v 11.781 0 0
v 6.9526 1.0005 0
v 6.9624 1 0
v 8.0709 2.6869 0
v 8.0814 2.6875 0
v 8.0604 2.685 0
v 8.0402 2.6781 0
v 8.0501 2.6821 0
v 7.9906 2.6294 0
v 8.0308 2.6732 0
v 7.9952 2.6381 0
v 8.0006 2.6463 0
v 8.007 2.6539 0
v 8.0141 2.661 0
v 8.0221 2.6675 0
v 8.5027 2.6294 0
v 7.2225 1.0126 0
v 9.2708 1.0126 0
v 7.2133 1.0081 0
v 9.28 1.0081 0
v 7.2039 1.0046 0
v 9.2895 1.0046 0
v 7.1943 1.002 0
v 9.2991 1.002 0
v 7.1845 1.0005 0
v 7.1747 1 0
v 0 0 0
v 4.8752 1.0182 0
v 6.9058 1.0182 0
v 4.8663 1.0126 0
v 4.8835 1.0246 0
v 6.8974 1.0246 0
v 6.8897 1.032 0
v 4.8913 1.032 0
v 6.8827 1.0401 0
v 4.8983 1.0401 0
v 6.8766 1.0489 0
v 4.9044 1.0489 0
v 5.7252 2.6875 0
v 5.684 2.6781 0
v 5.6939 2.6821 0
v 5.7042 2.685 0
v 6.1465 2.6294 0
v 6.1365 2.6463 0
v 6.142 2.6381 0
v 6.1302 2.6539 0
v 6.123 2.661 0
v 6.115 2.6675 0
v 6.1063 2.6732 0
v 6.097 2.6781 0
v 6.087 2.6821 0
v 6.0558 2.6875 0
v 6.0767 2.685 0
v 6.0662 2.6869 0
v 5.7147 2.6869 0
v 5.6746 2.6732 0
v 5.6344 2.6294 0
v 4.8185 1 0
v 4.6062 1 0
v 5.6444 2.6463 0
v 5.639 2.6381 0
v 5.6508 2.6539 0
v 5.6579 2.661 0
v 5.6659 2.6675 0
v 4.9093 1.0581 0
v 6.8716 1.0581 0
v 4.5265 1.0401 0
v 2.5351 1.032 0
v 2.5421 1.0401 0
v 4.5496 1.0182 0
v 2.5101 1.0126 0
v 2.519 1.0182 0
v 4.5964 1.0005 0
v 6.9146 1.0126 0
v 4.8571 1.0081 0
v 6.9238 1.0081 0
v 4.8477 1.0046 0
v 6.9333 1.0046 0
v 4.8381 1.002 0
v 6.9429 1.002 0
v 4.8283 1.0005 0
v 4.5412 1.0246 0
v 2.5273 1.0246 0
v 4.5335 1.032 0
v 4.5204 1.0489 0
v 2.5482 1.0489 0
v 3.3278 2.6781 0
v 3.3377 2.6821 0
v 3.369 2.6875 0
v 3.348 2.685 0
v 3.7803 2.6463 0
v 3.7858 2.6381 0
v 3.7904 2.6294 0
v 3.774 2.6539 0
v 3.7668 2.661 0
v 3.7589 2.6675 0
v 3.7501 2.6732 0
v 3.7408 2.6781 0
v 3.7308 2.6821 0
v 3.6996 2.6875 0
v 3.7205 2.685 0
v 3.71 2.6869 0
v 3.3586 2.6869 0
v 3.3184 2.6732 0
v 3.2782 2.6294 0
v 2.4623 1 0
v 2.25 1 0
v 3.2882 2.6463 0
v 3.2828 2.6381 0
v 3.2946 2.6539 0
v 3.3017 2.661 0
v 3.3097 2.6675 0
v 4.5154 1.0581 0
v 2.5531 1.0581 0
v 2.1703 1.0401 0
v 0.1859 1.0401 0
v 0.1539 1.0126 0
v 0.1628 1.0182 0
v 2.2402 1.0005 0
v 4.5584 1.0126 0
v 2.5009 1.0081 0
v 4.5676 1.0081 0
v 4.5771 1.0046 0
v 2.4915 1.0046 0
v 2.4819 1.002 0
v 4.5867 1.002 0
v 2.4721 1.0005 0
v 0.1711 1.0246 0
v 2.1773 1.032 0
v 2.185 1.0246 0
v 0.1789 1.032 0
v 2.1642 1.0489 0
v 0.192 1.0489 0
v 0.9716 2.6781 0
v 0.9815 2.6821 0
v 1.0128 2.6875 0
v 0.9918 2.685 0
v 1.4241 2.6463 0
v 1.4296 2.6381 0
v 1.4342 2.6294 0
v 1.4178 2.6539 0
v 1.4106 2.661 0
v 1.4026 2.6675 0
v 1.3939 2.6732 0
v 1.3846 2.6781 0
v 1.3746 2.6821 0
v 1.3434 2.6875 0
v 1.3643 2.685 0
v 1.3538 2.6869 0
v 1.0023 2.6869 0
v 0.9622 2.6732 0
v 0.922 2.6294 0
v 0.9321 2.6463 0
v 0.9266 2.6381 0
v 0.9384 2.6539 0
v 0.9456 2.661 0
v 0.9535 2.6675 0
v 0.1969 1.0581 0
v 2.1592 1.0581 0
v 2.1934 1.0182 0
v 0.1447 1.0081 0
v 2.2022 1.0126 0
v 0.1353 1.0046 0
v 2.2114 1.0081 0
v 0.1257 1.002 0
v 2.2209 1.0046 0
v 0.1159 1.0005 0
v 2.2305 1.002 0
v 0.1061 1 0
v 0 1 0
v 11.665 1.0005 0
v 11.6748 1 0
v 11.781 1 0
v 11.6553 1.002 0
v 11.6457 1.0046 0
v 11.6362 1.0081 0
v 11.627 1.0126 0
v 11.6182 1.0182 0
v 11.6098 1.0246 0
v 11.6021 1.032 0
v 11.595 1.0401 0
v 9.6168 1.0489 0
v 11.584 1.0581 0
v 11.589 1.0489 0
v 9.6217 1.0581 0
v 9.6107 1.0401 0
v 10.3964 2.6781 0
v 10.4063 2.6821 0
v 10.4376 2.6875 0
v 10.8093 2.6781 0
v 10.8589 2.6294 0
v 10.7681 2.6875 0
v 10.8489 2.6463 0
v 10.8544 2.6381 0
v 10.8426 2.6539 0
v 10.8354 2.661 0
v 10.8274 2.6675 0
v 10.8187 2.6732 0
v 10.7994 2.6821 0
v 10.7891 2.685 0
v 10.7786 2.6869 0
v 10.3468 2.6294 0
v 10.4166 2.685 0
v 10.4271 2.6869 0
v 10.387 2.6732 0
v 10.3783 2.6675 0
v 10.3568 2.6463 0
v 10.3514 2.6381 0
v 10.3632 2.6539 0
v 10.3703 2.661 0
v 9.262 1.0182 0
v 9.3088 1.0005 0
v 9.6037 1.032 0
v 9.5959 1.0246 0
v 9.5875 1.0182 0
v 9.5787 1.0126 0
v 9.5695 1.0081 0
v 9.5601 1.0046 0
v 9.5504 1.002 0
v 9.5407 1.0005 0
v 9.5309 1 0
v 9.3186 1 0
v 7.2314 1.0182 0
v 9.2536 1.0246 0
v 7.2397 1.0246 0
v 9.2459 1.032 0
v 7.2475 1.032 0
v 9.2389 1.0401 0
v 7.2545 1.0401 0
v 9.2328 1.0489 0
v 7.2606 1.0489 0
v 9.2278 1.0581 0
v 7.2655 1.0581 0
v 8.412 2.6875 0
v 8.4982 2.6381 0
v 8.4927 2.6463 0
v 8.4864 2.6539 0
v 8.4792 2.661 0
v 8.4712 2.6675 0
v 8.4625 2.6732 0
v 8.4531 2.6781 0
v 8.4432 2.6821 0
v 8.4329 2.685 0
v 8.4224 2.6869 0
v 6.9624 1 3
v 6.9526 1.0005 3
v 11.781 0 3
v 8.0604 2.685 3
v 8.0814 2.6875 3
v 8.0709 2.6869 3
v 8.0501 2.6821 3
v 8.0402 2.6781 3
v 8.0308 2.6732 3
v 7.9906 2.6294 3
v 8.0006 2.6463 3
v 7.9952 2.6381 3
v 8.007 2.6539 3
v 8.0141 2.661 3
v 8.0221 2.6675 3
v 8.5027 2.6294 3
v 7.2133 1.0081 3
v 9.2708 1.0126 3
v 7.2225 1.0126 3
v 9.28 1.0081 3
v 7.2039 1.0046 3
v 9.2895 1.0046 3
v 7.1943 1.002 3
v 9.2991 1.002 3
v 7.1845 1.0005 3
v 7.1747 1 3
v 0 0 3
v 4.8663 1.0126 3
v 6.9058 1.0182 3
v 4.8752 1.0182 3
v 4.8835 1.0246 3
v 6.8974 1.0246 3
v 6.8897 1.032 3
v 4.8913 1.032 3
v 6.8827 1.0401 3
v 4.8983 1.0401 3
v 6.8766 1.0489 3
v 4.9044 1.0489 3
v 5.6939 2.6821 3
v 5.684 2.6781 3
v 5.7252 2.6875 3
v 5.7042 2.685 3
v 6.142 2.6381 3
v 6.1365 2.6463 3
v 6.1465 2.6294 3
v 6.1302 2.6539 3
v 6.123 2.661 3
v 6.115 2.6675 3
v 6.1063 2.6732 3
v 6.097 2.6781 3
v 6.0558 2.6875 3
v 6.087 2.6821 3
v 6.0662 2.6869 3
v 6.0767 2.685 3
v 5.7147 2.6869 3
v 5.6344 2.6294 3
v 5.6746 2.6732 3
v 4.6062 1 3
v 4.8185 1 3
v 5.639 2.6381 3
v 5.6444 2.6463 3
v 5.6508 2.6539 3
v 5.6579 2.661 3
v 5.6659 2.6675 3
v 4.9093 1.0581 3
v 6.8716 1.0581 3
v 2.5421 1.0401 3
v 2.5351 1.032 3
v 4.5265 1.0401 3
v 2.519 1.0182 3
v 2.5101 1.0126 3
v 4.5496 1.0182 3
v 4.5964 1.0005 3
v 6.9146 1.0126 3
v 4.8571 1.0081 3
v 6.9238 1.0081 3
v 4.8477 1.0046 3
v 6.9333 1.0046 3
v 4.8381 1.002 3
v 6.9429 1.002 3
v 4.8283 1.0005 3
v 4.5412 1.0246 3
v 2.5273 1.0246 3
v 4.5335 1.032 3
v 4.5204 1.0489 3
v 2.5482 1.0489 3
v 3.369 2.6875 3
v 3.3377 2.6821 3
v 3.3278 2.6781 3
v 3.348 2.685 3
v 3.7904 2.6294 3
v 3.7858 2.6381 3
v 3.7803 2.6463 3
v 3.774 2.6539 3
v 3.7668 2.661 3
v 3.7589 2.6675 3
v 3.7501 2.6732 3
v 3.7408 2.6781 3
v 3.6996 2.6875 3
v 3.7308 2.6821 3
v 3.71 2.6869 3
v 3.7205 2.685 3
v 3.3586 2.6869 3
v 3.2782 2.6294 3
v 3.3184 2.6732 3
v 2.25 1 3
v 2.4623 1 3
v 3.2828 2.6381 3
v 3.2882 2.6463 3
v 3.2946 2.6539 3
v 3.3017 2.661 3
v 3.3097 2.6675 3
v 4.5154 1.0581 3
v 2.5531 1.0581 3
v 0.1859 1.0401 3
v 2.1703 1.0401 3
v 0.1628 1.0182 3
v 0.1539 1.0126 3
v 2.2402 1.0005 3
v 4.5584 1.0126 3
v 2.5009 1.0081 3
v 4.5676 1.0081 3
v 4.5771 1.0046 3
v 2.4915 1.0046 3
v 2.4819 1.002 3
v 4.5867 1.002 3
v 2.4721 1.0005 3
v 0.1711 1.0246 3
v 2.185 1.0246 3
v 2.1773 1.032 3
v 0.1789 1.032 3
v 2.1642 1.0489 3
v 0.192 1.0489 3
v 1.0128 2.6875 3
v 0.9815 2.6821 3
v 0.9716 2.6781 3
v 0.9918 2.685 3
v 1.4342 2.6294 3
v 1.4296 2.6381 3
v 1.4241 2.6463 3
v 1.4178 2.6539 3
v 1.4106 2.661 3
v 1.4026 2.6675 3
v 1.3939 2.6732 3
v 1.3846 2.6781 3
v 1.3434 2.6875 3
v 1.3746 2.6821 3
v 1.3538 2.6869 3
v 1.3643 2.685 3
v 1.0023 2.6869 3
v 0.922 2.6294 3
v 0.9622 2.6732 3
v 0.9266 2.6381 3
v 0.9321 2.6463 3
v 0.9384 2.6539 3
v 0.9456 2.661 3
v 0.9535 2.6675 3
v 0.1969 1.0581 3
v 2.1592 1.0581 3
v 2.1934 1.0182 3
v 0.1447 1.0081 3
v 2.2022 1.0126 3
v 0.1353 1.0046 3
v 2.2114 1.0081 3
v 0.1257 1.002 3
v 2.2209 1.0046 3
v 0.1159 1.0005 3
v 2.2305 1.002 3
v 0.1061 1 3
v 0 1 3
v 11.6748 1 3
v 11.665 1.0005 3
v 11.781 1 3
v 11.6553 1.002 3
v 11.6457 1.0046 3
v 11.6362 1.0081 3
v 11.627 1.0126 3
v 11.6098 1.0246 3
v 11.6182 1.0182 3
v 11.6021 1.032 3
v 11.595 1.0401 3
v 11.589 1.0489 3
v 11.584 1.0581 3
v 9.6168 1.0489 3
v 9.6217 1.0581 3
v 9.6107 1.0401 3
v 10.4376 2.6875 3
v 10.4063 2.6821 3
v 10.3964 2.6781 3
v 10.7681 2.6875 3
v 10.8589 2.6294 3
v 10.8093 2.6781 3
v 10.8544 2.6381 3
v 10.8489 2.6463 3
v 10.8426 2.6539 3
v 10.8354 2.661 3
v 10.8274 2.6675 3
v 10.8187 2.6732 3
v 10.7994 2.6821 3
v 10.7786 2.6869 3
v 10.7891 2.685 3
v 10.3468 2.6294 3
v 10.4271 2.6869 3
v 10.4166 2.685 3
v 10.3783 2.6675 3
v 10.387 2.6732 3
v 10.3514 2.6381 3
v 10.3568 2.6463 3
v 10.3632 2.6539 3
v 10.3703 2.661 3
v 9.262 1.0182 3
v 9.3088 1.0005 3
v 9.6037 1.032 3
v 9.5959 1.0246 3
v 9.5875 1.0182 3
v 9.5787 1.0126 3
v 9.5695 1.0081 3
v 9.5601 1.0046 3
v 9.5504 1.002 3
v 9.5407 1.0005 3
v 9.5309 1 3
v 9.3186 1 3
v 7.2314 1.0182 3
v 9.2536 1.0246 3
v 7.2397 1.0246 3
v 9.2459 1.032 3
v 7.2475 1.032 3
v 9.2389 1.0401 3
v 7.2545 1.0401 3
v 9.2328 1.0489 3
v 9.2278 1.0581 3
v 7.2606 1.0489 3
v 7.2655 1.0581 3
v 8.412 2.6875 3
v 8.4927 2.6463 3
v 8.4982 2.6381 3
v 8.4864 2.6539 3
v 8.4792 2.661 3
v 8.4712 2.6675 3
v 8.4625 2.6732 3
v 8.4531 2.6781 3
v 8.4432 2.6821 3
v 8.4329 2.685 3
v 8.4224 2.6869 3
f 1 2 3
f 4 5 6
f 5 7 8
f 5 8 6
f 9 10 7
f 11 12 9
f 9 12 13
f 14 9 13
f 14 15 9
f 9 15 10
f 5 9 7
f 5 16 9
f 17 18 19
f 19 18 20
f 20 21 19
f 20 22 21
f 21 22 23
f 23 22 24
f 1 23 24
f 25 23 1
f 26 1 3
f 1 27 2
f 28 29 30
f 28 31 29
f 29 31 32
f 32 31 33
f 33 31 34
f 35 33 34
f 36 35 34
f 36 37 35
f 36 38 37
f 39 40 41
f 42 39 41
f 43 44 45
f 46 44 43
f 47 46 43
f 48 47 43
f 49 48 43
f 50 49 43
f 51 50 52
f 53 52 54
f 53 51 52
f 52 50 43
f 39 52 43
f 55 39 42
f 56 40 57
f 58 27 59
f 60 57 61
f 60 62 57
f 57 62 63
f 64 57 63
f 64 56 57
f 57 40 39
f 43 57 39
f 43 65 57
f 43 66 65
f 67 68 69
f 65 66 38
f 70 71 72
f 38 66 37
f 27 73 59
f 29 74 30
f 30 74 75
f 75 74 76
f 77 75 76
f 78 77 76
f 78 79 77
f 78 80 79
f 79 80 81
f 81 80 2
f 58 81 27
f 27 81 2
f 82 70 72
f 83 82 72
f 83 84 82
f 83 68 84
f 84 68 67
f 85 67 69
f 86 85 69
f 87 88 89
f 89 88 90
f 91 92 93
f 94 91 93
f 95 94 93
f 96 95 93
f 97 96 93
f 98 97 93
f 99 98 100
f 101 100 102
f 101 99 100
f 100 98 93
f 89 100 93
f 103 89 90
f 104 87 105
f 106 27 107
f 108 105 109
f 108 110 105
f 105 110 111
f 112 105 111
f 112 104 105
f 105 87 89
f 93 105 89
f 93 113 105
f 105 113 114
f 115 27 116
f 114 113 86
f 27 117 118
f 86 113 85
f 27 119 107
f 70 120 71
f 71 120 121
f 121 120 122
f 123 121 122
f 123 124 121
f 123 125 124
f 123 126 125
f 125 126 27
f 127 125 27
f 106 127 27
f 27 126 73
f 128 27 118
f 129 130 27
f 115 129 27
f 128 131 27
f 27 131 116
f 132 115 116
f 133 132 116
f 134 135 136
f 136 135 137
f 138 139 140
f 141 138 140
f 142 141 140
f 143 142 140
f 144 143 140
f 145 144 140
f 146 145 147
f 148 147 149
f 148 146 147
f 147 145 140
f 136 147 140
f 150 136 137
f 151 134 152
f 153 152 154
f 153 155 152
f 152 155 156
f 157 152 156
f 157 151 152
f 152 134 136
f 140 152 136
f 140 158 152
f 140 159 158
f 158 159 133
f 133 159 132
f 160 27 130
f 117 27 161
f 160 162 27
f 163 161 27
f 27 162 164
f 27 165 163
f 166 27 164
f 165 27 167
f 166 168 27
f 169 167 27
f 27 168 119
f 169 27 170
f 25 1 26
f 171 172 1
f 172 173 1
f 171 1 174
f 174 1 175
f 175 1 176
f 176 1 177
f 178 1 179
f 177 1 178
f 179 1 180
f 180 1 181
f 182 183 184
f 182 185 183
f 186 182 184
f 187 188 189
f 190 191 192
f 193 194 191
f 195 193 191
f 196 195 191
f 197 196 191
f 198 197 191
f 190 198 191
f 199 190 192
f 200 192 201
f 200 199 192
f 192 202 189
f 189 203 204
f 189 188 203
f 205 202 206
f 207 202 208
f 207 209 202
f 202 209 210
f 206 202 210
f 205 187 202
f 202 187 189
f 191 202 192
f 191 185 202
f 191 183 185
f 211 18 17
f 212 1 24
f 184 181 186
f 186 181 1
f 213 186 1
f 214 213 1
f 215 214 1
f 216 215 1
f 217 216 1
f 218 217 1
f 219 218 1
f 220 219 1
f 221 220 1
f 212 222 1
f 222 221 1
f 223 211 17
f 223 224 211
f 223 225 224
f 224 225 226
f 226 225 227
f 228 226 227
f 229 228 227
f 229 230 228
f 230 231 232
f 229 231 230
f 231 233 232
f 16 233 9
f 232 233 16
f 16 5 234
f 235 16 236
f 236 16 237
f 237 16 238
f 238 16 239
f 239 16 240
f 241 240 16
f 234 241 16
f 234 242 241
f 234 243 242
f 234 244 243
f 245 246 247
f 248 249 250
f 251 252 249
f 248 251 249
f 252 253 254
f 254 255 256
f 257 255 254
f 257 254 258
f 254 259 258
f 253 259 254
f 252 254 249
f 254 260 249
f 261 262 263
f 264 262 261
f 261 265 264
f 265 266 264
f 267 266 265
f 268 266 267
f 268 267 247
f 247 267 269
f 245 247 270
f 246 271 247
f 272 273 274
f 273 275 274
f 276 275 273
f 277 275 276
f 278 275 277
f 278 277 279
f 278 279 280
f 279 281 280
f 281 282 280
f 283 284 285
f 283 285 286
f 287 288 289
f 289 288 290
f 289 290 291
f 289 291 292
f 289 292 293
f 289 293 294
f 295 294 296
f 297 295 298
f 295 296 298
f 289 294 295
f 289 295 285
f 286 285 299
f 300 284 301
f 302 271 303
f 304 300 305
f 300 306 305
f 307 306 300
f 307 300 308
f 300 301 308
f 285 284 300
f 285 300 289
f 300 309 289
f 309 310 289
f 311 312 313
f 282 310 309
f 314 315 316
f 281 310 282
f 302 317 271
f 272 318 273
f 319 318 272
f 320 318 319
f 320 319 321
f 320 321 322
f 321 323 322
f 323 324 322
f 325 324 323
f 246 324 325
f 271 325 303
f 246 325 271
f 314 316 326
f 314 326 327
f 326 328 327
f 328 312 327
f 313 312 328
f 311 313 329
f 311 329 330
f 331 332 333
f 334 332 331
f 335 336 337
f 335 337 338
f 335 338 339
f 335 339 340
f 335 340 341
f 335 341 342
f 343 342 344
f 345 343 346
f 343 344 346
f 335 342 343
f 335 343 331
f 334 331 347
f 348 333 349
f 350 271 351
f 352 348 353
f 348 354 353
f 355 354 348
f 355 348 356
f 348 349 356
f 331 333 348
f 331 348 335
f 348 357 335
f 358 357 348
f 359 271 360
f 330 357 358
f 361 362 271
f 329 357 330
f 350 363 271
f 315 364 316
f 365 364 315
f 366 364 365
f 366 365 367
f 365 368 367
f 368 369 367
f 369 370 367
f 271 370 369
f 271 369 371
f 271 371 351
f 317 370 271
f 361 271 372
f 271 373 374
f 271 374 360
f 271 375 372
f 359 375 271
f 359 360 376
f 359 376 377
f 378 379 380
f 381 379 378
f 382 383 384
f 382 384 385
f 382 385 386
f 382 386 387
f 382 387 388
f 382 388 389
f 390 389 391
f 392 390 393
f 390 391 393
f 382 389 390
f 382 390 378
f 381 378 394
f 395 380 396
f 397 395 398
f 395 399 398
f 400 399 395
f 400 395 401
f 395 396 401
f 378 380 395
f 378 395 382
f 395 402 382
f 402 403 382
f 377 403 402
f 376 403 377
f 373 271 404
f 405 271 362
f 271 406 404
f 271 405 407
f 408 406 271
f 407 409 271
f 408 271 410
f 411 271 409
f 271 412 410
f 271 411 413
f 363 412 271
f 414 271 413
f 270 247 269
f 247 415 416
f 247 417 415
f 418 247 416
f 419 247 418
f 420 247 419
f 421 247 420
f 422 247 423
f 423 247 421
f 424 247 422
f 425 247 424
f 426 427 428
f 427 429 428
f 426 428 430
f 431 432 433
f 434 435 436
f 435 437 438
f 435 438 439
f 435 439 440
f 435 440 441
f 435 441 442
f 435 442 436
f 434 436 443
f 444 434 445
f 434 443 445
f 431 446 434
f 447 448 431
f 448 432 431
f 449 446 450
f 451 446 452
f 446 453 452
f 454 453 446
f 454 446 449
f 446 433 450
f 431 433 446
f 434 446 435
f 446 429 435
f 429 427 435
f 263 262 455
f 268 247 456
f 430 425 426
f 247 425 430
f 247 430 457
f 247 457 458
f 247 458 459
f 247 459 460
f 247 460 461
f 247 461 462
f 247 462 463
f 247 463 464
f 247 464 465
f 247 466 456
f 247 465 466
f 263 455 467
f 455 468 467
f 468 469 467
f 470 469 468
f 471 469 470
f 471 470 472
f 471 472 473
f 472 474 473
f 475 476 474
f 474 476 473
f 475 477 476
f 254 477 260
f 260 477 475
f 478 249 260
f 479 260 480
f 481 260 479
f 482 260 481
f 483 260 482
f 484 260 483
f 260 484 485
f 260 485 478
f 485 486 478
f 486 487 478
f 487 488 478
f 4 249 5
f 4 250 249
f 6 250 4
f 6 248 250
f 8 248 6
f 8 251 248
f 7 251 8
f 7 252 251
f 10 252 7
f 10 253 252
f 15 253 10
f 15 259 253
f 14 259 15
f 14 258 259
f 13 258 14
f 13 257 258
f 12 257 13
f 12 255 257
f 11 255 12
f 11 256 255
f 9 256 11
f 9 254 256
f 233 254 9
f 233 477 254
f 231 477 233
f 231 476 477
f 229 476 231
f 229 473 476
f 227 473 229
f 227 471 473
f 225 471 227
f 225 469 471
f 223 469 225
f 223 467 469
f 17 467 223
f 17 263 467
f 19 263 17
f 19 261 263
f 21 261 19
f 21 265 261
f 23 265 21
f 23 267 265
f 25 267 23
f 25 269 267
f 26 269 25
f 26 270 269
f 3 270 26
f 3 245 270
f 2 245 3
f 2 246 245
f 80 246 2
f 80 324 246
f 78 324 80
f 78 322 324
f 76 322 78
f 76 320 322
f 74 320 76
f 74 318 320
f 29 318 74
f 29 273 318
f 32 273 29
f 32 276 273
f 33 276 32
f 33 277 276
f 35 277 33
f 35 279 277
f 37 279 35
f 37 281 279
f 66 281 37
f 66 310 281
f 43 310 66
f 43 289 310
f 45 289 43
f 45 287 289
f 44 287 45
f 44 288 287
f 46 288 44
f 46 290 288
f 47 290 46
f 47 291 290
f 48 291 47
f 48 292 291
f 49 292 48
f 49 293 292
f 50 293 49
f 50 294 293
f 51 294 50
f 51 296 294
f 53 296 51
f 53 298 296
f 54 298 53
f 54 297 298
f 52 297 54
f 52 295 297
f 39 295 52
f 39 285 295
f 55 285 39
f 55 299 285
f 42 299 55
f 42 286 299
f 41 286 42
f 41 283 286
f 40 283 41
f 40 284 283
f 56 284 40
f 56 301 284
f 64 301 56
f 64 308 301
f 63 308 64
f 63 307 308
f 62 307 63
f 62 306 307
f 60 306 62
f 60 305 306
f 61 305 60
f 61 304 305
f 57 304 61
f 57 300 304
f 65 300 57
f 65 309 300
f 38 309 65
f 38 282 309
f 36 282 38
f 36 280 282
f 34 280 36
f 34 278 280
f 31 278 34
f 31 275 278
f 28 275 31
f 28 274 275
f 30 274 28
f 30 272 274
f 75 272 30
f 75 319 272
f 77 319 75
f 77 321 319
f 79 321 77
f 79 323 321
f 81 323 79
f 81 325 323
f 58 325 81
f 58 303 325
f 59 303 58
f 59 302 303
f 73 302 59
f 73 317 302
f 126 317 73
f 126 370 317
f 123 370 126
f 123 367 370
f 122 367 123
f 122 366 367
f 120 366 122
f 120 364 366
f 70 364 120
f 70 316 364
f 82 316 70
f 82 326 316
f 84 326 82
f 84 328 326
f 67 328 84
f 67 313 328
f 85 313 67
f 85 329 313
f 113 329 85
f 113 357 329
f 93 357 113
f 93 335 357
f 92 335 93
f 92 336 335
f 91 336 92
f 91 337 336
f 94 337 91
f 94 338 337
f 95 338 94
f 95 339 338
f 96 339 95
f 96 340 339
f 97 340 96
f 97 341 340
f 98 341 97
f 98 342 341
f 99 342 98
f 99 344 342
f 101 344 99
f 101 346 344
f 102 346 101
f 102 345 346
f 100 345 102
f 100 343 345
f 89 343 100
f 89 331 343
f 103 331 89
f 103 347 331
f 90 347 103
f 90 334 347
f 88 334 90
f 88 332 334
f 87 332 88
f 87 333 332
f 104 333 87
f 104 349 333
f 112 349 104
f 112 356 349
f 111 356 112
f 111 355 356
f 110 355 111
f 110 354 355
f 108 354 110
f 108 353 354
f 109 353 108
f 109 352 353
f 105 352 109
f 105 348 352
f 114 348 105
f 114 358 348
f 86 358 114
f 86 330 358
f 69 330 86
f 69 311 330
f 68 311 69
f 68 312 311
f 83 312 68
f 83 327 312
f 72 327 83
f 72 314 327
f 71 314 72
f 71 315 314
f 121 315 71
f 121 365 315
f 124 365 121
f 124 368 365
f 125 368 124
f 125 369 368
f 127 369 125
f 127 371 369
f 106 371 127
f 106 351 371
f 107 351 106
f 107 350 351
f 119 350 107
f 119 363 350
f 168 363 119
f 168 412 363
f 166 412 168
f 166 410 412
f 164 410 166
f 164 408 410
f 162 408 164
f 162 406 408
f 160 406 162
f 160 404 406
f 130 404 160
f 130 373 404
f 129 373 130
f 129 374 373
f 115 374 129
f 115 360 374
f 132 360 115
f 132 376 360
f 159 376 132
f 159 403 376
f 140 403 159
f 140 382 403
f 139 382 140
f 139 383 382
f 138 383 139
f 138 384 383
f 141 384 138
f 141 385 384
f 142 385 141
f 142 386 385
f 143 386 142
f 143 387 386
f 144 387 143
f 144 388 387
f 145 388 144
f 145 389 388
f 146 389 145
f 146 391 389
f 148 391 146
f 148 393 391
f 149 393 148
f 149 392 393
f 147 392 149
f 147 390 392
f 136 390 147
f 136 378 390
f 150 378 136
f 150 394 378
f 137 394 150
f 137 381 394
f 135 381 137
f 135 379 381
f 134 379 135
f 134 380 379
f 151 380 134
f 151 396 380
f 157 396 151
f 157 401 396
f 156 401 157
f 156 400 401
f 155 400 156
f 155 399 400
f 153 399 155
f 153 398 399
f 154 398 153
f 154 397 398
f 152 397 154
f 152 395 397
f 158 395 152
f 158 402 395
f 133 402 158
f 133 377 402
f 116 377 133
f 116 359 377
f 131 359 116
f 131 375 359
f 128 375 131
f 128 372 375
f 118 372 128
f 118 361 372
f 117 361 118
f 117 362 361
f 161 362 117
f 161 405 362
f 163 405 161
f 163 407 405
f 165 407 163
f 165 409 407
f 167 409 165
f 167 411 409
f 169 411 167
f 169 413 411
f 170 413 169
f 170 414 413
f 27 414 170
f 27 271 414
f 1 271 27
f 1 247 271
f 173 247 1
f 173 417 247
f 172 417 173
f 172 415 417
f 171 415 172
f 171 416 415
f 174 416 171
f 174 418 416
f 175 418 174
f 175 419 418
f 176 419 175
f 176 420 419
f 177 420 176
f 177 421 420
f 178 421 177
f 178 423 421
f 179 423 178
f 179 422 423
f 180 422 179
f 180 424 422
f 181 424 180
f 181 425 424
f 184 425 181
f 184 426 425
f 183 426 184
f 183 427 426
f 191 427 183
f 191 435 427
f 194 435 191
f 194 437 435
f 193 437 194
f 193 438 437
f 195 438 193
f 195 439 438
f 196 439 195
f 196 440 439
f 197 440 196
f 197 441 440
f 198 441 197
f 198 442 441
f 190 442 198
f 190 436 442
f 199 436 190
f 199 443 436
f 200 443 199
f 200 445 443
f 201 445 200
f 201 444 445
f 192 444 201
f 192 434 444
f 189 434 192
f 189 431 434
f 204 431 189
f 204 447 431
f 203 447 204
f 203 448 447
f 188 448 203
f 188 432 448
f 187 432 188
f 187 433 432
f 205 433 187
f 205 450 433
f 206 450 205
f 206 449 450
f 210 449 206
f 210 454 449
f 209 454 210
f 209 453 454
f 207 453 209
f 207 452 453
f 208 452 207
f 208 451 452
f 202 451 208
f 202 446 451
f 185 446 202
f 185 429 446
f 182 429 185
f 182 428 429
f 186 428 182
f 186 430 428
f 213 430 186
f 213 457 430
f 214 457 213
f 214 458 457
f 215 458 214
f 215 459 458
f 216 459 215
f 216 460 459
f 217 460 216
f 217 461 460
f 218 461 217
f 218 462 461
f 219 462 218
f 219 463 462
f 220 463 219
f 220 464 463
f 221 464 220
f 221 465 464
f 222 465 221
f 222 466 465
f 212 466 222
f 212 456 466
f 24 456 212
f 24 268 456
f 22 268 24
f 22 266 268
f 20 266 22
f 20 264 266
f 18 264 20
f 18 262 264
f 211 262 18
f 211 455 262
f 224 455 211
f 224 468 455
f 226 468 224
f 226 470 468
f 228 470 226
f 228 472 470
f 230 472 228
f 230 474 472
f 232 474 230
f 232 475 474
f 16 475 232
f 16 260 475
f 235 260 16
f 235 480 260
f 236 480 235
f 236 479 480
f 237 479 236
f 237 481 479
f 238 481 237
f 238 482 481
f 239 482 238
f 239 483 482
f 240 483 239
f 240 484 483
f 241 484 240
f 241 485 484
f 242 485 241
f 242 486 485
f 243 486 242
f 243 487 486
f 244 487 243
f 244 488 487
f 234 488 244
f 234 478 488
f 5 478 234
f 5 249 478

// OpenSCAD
// file: ../src/involute.scad
include <constants.scad>
/**
  Evaluates the involute of a circle with radius r, for the parameter theta (in degrees)

  @param theta  Parameter value (in degrees)
  @param r      Circle radius
*/
function circle_involute(theta, r) = let (c = cos(theta), s = sin(theta))
  r * [c + theta * D2R * s, s - theta * D2R * c];

/**
  Returns the parameter theta (in degrees) for the intersection between the involute 
  of a circle with radius (or diameter) r and another circle with radius (or diameter) R.

  @param r  Involute circle radius
  @param R  Radius of "the other circle" or just a distance from the origin
*/
function circle_involute_intersect(r, R) = R2D * sqrt(pow(R / r, 2) - 1);

/**
  Returns the length of a circle involute in the interval [0,theta]

  @param theta  Parameter value (in degrees) 
  @param r      Involute circle radius
*/
function circle_involute_length(theta, r) = r * pow(D2R * theta, 2) / 2;

/**
  Returns the parameter theta (in degrees) for a given length of a circle involute

  @param L  Distance along the circle involute curve [mm] 
  @param r  Involute circle radius [mm]
*/
function circle_involute_param(L, r) = R2D * sqrt(2 * L / r);
// file: ../src/arc.scad
include <constants.scad>
include <geom_helpers.scad>

/**
  Returns the length of a circular arc

  @param theta  Included angle (degrees)
  @param r      Radius [mm]
*/
function arc_length(theta, r) = (theta * D2R) * r;

/*
  Generates a circular arc by a modified version of the "Circle Spline" algorithm.
  
  Endpoint tangents and radius are given.
  The intersection point (corner) is located at (0, 0).
  Not possible here to check if the radius is too large w.r.t. the geometry.

  @param v1   Direction of the 1st line
  @param v2   Direction of the 2nd line
  @param r    Fillet radius
  @param res  Arc resolution
*/
function gen_arc(v1, v2, r, C = [0, 0], res = DEFAULT_ARC_RES) = let (
  a = normalize(v1),
  b = normalize(v2),
  tau = acos(a * b),
  zdir = sign(cross(a, b)),
  N = curve_segments(arc_length(tau, r), res),
  dtau = zdir * (tau / 2) / N,
  c = r * sqrt(2 * (1 - cos(tau))),
  d = r * tan(tau / 2),
  p0 = -d * a,
  V = [
    a,
    for (i = [1:N])
      let (cc = cos(i * dtau), ss = sin(i * dtau))
      a * [[cc, ss],[-ss, cc]]
  ]
) [
  C + p0,
  for (i = [1:N])
    let (
      u = i / N,
      tau_u = u * tau / 2,
      r_u = c * sin(u * tau_u) / sin(tau_u)
    )
    C + p0 + r_u * V[i]
];
// file: ../src/geom_helpers.scad
include <constants.scad>

/**
  Returns the number of line segments required to generate a curve at a given resolution.

  @param L    Curve length (line integral) [mm]
  @param res  Resolution [mm]
*/
function curve_segments(L, res) = min(MAX_ARC_SEGM, max(MIN_ARC_SEGM, floor(L / res + .5)));

/**
  Mirrors the 2D-vector(s) in v about the axis a

  Usage:
    P = [[1, 0], [1, 1], [1, 2]];
    a = [0, 1];
    Pm = mirror2(P, a);

  @param v  Vector(s) to mirror [[v0], [v1], ..., [vn]]
  @param a  Mirror axis: a = [ax, ay]
*/
function mirror2(v, a) = let (
    // a * a'
    A = [
      [a[0] * a[0], a[0] * a[1]],
      [a[1] * a[0], a[1] * a[1]]
    ]
  )
  v - 2 * v * (EYE2 - A);

/**
  Reverses the order of the items in the given array

  Usage:
    P = [[0,1],[1,0],[2,1], [2,2],[1,3],[0,2]];
    Pr = reverse(P);

  @param arr  1-dimensional array with items of any type
*/
function reverse(arr) = [for (k = [len(arr)-1:-1:0]) arr[k]];

/**
  Inverse of 2-by-2 matrix
*/
function inv2(A) = let (detA = A[0][0] * A[1][1] - A[0][1] * A[1][0])
  [[A[1][1], -A[0][1]], [-A[1][0], A[0][0]]] / detA;

/**
  Returns the intersection between two lines given in parametric form

  Line 1: P + s * u
  Line 2: Q + t * v
*/
function line_line_intersect(P, u, Q, v) = let (
    x = [Q - P] * inv2([u, -v])
  )
  P + x[0][0] * u;

/**
  Returns the normalized vector (v)
*/
function normalize(v) = v / norm(v);
// file: ../src/constants.scad
D2R = PI / 180;
R2D = 180 / PI;
MIN_ARC_SEGM = 1;
MAX_ARC_SEGM = 1000;
DEFAULT_ARC_RES = 0.1;
EYE2 = [[1, 0], [0, 1]];
RZ90 = [[0, 1], [-1, 0]];
RZ90N = [[0, -1], [1, 0]];
TYPE_PINION = "pinion";
TYPE_RACK = "rack";
// file: ../src/spur_gear_rack.scad
include <constants.scad>
include <prop_helpers.scad>
include <geom_helpers.scad>
include <involute.scad>
include <arc.scad>

/*
  Gear rack initialization

  @param props      Properties obtained from `spur_gear_init`
  @param z          No. of teeth
  @param width      Gear rack width [mm]
  @param thickness  Gear rack thickness [mm]
  @param rf         Fillet radius [mm] (default: 0)
*/
function spur_gear_rack_init(props, z, width, thickness, rf = 0, res = DEFAULT_ARC_RES) =
  assert(z > 0, "No. of teeth (z) must be greater than 0")
  assert(width > 0, "Width must be greater than 0")
  assert(thickness > 0, "Thickness must be greater than 0")
  assert(rf >= 0, "Fillet radius must be greater than or equal to 0")
  assert(res > 0, "Resolution must be greater than 0")
  let (
    m = find_prop_value("m", props),
    b = find_prop_value("b", props),
    alpha = find_prop_value("alpha", props),
    r = find_prop_value("r", props),
    P = find_prop_value("P", props),

    pitch = PI * m,
    // Center line for the gear rack tooth (pointing outwards)
    w = normalize(P[3]),
    // Create the normal vector (wn) by rotating (w) by 90 degrees
    wn = w * RZ90,
    // Tangent points for the "pressure vector"
    T = circle_involute(alpha, r),
    Tm = mirror2(T, normalize(P[1])),
    Tm2 = mirror2(Tm, w),
    // Gear rack (A)ddendum and (D)edendum points along the tooth center line
    M = (Tm + Tm2) / 2,
    Pa = M - m * w,
    Pd = M + b * w,
    // Gear rack profile
    //  Solve for the rack segment starting point
    //  Intersect the vector (wn) through the points A and D, with the tangent (t) through the point (Tm)
    t = mirror2([cos(alpha), sin(alpha)], normalize(P[1])),
    R = [
      Pd - (pitch / 2) * wn,
      line_line_intersect(Pd, wn, Tm, t),
      line_line_intersect(Pa, wn, Tm, t)
    ],
    // Validate fillet radius
    v1 = normalize(R[1]-R[0]),
    v2 = normalize(R[2]-R[1]),
    tau = acos(v1 * v2),
    rfmax = norm(R[1]-R[0])/tan(tau / 2),
    // assert(rf <= rfmax, "Fillet radius is too large"), // this produces a warning!
    // Generate the rack profile by concatenating the rack segment with its mirror
    // rack_profile = concat(R, mirror2(reverse(R), w)),
    // Generate fillets
    A1 = gen_arc(wn, R[2]-R[1], rf, R[1], res),
    A2 = gen_arc(R[2]-R[1], wn, rf, R[2], res),
    pts = concat([R[0]], A1, A2, [R[2]]),
    rack_profile = concat(pts, mirror2(reverse(pts), w)),
    Pref = rack_profile[0] + thickness * w,
    // Generate the rack polygon (with the rack teeth) by sequential translations of the gear rack profile along the vector (wn)
    rack_polygon = [
      for (i = [0:z-1])
        let (T = i * pitch * wn - Pref)
        for (j = [0:len(rack_profile)-1])
          rack_profile[j] + T,
        rack_profile[0] - Pref + z * pitch * wn + thickness * w,
        rack_profile[0] - Pref + thickness * w,
    ] * [[w[0], wn[0]], [w[1], wn[1]]] * RZ90N
  )
  assert(rf <= rfmax, "Fillet radius is too large")
[
  ["type", TYPE_RACK],
  ["m", m],
  ["alpha", alpha],
  ["b", b],
  ["z", z],
  ["pitch", pitch],
  ["width", width],
  ["thickness", thickness],
  ["rf", rf],
  ["rfmax", rfmax],
  ["rack_profile", rack_profile],
  ["rack_polygon", rack_polygon],
];

/*
  Create gear rack

  @param props  Properties obtained from `spur_gear_rack_init`
*/
module spur_gear_rack(props) {
  width = find_prop_value("width", props);
  thickness = find_prop_value("thickness", props);
  rack_polygon = find_prop_value("rack_polygon", props);

  render(convexity = 2)
    linear_extrude(width)
      polygon(rack_polygon);
}
// file: ../src/spur_gear_pinion.scad
include <constants.scad>
include <prop_helpers.scad>
include <geom_helpers.scad>
include <arc.scad>
include <involute.scad>

/**
  Pinion initialization

  @param props      Properties obtained from `spur_gear_init`
  @param w          Width [mm]
  @param arc_resol  Arc resolution [mm]
*/
function spur_gear_pinion_init(props, w, arc_resol = DEFAULT_ARC_RES) =
  assert(w > 0, "Width (w) must be greater than 0")
  assert(arc_resol > 0, "Arc resolution (arc_resol) must be greater than 0")
  let (
  m = find_prop_value("m", props),
  b = find_prop_value("b", props),
  alpha = find_prop_value("alpha", props),
  z = find_prop_value("z", props),
  r = find_prop_value("r", props),
  P = find_prop_value("P", props),
  cp = find_prop_value("cp", props),
  D = find_prop_value("D", props),
  Db = find_prop_value("Db", props),
  Dr = find_prop_value("Dr", props),
  Dc = find_prop_value("Dc", props),
  Dp = find_prop_value("Dp", props),

  theta_a = circle_involute_intersect(Db, D),    // Intersection between the circle involute and the addendum circle
  // pa = circle_involute(theta_a, r),
  // Generate point along the gear tooth profile (from the base circle, theta=0, to the addendum circle, theta=theta_a)
  L = circle_involute_length(theta_a, r),
  N = curve_segments(L, arc_resol),  
  profile = [
    [Dr / 2, 0],
    for (k = [0:N])
      // let (theta = k * theta_a / N) // non-uniform arc length parametrization
      let (theta = circle_involute_param(k * L / N, r)) // uniform arc length parametrization
      circle_involute(theta, r)
  ],
  // Mirror the gear profile about the axis P[1], reversed order
  profile_m = mirror2(reverse(profile), normalize(P[1])),
  // Included angle of the addendum arc
  v1 = normalize(profile[len(profile)-1]),
  v2 = normalize(profile_m[0]),
  ang_a = acos(v1*v2),
  Ta = [v1, [-v1[1], v1[0]]],
  // Included angle of the root arc
  u1 = normalize(profile[0]),
  u2 = normalize(profile_m[len(profile_m)-1]),
  ang_r = cp - acos(u1*u2),
  Tr = [u2, [-u2[1], u2[0]]],
  // Generate points on the addendum and root arcs (for the gear tooth profile)
  Na = curve_segments(arc_length(ang_a, D / 2), arc_resol),
  Nr = curve_segments(arc_length(ang_r, Dr / 2), arc_resol),
  profile_a = [for (k = [0:Na])
    (D / 2) * [cos(k * ang_a / Na), sin(k * ang_a / Na)] * Ta
  ],
  profile_r = [for (k = [0:Nr])
    (Dr / 2) * [cos(k * ang_r / Nr), sin(k * ang_r / Nr)] * Tr
  ],
  // Generate the complete polygon for the pinion by a sequence of rotations of the base profile about the z-axis
  pinion_profile = concat(profile, profile_a, profile_m, profile_r),
  pinion_polygon = [
    for (i = [0:z-1])
      let (
        c = (i == 0) ? 0 : cos(i * cp),
        s = (i == 0) ? 0 : sin(i * cp),
        Rz = (i == 0) ? [] : [[c, s], [-s, c]]
      )
      for (j = [0:len(pinion_profile)-1])
        (i == 0) ? pinion_profile[j] : pinion_profile[j] * Rz
  ]
) [
  ["type", TYPE_PINION],
  ["m", m],
  ["alpha", alpha],
  ["b", b],
  ["z", z],
  ["cp", cp],
  ["w", w],
  ["D", D],
  ["Db", Db], ["r", r],
  ["Dc", Dc],
  ["Dp", Dp],
  ["Dr", Dr],
  ["pinion_polygon", pinion_polygon],
];

/**
  x[0] - alpha, pinion A involute parameter
  x[1] - gamma, pinion B rotation angle
  phiA - angle of the selected tooth on pinion A
  phiB - angle of the selected tooth on pinion B
  ra - radius of pinion A base circle
  rb - radius of pinion B base circle
  Ca - center of pinion A
  Cb - center of pinion B
*/
function _pos(x, phiA, phiB, ra, rb, Ca, Cb) = let (
  cosa = cos(phiA),
  sina = sin(phiA),
  cosb = cos(phiB + x[1]),
  sinb = sin(phiB + x[1]),
  A = [[cosa, sina], [-sina, cosa]],
  B = [[cosb, sinb], [-sinb, cosb]],
  beta = phiA + x[0] + 180 - phiB - x[1],
  Ia = circle_involute(x[0], ra),
  Ib = circle_involute(beta, rb)
) Ia * A - Ib * B - (Cb - Ca);

/**
  Recursive Newton-Raphson solver (since OpenSCAD doesn't allow re-assigning variables)
*/
function _solve_rotation(phiA, phiB, ra, rb, Ca, Cb, x = [180 / PI, 0], it = 20, h = 1e-10, ftol = 1e-9) =
  let (
    fx = _pos(x, phiA, phiB, ra, rb, Ca, Cb),
    J = [
      (_pos(x + [h, 0], phiA, phiB, ra, rb, Ca, Cb) - fx) / h,
      (_pos(x + [0, h], phiA, phiB, ra, rb, Ca, Cb) - fx) / h
    ],
    xx = x - fx * inv2(J),
    fnorm = norm(_pos(xx, phiA, phiB, ra, rb, Ca, Cb))
  )
  (it > 0 && fnorm > ftol)
    ? _solve_rotation(phiA, phiB, ra, rb, Ca, Cb, xx, it - 1)
    : xx[1];

/**
  Returns the 4-by-4 transformation matrix to position pinion 2 relative to pinion 1, along the direction vector (v)

    use multmatrix(T) to apply the transformation

  (After applying the transformation, the two pitch circles will become tangential)
*/
function pinion_position(props1, props2, v) = 
  assert(
    find_prop_value("type", props1) == TYPE_PINION && find_prop_value("type", props2) == TYPE_PINION,
    "Requires two pinions"
  )
  assert(
    find_prop_value("m", props1) == find_prop_value("m", props2) &&
    find_prop_value("alpha", props1) == find_prop_value("alpha", props2),
    "Non-meshing pinions"
  )
  assert(len(v) == 2 && norm(v) > 0, "Invalid direction vector (v)")
  let (
    phiA = find_prop_value("cp", props1),
    phiB = find_prop_value("cp", props2),
    ra = find_prop_value("r", props1),
    rb = find_prop_value("r", props2),
    Dp1 = find_prop_value("Dp", props1),  // Pitch circle diam. of pinion 1
    Dp2 = find_prop_value("Dp", props2),  // Pitch circle diam. of pinion 2
    Ca = [0, 0],  // Center pt. of pinion 1
    Cb = (Dp1 + Dp2) / 2 * normalize(v),  // Center pt. of pinion 2
    // Find index of a nearby tooth in the direction v, on pinion A.
    // The algorithm is not sensitive to the choise of tooth on pinion B, but
    // we want to perform small rotations to not mess up the coordinate system when positioning
    // linked pinions.
    phi = (atan2(v[1], v[0]) + 360) % 360,
    i = floor(phi / phiA),
    j = floor(((phi + 180) % 360) / phiB),
    rz = _solve_rotation(i * phiA, j * phiB, ra, rb, Ca, Cb)
) [
  [cos(rz), -sin(rz), 0, Cb[0]],
  [sin(rz), cos(rz), 0, Cb[1]],
  [0, 0, 1, 0],
  [0, 0, 0, 1]
];

/**
  Create pinion

  @param props  Properties obtained from `spur_gear_pinion_init`
*/
module spur_gear_pinion(props) {
  w = find_prop_value("w", props);
  pinion_polygon = find_prop_value("pinion_polygon", props);
  
  render(convexity = 2)
    linear_extrude(w)
      polygon(pinion_polygon);
}
// file: ../src/spur_gear_init.scad
include <constants.scad>
include <prop_helpers.scad>
include <geom_helpers.scad>
include <arc.scad>
include <involute.scad>

/**
  Spur Gear Initialization

  @param m          Module (addendum) [mm]
  @param z          No. of teeth
  @param alpha      Pressure angle [deg]
*/
function spur_gear_init(z, m, alpha) =
  assert(z > 0, "No. of teeth (z) must be greater than 0")
  assert(m > 0, "Module (m) must be greater than 0")
  assert(alpha > 0, "Pressure angle (alpha) must be greater than 0")
  let (
  Dp = m * z,           // Pitch circle diam.
  Db = Dp * cos(alpha), // Base circle diam.
  r = Db / 2,
  D = Dp + 2 * m,       // Addendum circle diam.
  Dc = Dp - 2 * m,      // Clearance circle diam.
  b = 1.25 * m,         // Dedendum
  Dr = Dp - 2 * b,      // Root circle diam.
  cp = 360 / z,         // Circular pitch angle, same as 2*PI*P/(PI*Dp)
  theta_p = circle_involute_intersect(r, Dp / 2),  // Intersection between the circle involute and the pitch circle
  // Generate the "construction points"
  // Rotate the intersection point to get intermediate points along the pitch circle
  //  1/4: defines the vector used when mirroring, i.e. the tooth center line
  //  3/4: used to construct the gear rack
  p = circle_involute(theta_p, r),
  P = [
    p,
    for (k = [1:4])
      let (a = k * cp / 4, c = cos(a), s = sin(a), Rz = [[c, s], [-s, c]])
      p * Rz
  ]
) [
  ["m", m],
  ["alpha", alpha],
  ["b", b],
  ["z", z],
  ["cp", cp],
  ["D", D],
  ["Db", Db], ["r", r],
  ["Dc", Dc],
  ["Dp", Dp],
  ["Dr", Dr],
  ["P", P],
];
// file: ../src/prop_helpers.scad
// https://en.wikibooks.org/wiki/OpenSCAD_User_Manual/Other_Language_Features#search
function find_prop_index(prop_name, arr) =
  search([prop_name], arr, num_returns_per_match = 1, index_col_num = 0)[0];

function find_prop_value(prop_name, arr) =
  arr[search([prop_name], arr, num_returns_per_match = 1, index_col_num = 0)[0]][1];
// file: ../src/version.scad
SPURGEAR_SEMVER = [1, 2, 0];

function spurgear_required(ver) =
  assert(len(ver) == 3, "Version array must have three semantic version elements")
  SPURGEAR_SEMVER[0] >= ver[0] && SPURGEAR_SEMVER[1] >= ver[1] && SPURGEAR_SEMVER[2] >= ver[2];
// file: ../SpurGear.scad
include <src/version.scad>
include <src/prop_helpers.scad>
include <src/spur_gear_init.scad>
include <src/spur_gear_pinion.scad>
include <src/spur_gear_rack.scad>

/*****************************************************************************
  spur_gear_init(z, m, alpha)
******************************************************************************
  Spur Gear Initialization

  Parameters:
    m - Module (addendum) [mm]
    z - No. of teeth
    alpha - Pressure angle [deg]
*****************************************************************************/

/*****************************************************************************
  spur_gear_pinion_init(props, w, arc_resol = DEFAULT_ARC_RES)
******************************************************************************
  Pinion initialization

  Parameters:
    props - Properties obtained from `spur_gear_init`
    w - Width [mm]
    arc_resol - Arc resolution [mm]
*****************************************************************************/

/*****************************************************************************
  spur_gear_pinion(props)
******************************************************************************
  Create pinion

  Parameters:
    props - Properties obtained from `spur_gear_pinion_init`
*****************************************************************************/

/*****************************************************************************
  spur_gear_rack_init(props, z, width, thickness)
******************************************************************************
  Gear rack initialization

  Parameters:
    props - Properties obtained from `spur_gear_init`
    z - No. of teeth
    width - Gear rack width [mm]
    thickness - Gear rack thickness [mm]
*****************************************************************************/

/*****************************************************************************
  spur_gear_rack(props)
******************************************************************************
  Create gear rack

  Parameters:
    props - Properties obtained from `spur_gear_rack_init`
*****************************************************************************/
// main file
use <../SpurGear.scad>
assert(spurgear_required([1, 2, 0]), "Please upgrade SpurGear library to version 1.2.0 or higher");

gear = spur_gear_init(z = 16, m = 0.75, alpha = 20.0);
rack = spur_gear_rack_init(gear, z = 5, width = 3.0, thickness = 1.0, rf = .1, res = .01);

echo(rack = rack);

// translate([0, 3.0, 0])
// rotate([90, 0, 0])
spur_gear_rack(rack);
